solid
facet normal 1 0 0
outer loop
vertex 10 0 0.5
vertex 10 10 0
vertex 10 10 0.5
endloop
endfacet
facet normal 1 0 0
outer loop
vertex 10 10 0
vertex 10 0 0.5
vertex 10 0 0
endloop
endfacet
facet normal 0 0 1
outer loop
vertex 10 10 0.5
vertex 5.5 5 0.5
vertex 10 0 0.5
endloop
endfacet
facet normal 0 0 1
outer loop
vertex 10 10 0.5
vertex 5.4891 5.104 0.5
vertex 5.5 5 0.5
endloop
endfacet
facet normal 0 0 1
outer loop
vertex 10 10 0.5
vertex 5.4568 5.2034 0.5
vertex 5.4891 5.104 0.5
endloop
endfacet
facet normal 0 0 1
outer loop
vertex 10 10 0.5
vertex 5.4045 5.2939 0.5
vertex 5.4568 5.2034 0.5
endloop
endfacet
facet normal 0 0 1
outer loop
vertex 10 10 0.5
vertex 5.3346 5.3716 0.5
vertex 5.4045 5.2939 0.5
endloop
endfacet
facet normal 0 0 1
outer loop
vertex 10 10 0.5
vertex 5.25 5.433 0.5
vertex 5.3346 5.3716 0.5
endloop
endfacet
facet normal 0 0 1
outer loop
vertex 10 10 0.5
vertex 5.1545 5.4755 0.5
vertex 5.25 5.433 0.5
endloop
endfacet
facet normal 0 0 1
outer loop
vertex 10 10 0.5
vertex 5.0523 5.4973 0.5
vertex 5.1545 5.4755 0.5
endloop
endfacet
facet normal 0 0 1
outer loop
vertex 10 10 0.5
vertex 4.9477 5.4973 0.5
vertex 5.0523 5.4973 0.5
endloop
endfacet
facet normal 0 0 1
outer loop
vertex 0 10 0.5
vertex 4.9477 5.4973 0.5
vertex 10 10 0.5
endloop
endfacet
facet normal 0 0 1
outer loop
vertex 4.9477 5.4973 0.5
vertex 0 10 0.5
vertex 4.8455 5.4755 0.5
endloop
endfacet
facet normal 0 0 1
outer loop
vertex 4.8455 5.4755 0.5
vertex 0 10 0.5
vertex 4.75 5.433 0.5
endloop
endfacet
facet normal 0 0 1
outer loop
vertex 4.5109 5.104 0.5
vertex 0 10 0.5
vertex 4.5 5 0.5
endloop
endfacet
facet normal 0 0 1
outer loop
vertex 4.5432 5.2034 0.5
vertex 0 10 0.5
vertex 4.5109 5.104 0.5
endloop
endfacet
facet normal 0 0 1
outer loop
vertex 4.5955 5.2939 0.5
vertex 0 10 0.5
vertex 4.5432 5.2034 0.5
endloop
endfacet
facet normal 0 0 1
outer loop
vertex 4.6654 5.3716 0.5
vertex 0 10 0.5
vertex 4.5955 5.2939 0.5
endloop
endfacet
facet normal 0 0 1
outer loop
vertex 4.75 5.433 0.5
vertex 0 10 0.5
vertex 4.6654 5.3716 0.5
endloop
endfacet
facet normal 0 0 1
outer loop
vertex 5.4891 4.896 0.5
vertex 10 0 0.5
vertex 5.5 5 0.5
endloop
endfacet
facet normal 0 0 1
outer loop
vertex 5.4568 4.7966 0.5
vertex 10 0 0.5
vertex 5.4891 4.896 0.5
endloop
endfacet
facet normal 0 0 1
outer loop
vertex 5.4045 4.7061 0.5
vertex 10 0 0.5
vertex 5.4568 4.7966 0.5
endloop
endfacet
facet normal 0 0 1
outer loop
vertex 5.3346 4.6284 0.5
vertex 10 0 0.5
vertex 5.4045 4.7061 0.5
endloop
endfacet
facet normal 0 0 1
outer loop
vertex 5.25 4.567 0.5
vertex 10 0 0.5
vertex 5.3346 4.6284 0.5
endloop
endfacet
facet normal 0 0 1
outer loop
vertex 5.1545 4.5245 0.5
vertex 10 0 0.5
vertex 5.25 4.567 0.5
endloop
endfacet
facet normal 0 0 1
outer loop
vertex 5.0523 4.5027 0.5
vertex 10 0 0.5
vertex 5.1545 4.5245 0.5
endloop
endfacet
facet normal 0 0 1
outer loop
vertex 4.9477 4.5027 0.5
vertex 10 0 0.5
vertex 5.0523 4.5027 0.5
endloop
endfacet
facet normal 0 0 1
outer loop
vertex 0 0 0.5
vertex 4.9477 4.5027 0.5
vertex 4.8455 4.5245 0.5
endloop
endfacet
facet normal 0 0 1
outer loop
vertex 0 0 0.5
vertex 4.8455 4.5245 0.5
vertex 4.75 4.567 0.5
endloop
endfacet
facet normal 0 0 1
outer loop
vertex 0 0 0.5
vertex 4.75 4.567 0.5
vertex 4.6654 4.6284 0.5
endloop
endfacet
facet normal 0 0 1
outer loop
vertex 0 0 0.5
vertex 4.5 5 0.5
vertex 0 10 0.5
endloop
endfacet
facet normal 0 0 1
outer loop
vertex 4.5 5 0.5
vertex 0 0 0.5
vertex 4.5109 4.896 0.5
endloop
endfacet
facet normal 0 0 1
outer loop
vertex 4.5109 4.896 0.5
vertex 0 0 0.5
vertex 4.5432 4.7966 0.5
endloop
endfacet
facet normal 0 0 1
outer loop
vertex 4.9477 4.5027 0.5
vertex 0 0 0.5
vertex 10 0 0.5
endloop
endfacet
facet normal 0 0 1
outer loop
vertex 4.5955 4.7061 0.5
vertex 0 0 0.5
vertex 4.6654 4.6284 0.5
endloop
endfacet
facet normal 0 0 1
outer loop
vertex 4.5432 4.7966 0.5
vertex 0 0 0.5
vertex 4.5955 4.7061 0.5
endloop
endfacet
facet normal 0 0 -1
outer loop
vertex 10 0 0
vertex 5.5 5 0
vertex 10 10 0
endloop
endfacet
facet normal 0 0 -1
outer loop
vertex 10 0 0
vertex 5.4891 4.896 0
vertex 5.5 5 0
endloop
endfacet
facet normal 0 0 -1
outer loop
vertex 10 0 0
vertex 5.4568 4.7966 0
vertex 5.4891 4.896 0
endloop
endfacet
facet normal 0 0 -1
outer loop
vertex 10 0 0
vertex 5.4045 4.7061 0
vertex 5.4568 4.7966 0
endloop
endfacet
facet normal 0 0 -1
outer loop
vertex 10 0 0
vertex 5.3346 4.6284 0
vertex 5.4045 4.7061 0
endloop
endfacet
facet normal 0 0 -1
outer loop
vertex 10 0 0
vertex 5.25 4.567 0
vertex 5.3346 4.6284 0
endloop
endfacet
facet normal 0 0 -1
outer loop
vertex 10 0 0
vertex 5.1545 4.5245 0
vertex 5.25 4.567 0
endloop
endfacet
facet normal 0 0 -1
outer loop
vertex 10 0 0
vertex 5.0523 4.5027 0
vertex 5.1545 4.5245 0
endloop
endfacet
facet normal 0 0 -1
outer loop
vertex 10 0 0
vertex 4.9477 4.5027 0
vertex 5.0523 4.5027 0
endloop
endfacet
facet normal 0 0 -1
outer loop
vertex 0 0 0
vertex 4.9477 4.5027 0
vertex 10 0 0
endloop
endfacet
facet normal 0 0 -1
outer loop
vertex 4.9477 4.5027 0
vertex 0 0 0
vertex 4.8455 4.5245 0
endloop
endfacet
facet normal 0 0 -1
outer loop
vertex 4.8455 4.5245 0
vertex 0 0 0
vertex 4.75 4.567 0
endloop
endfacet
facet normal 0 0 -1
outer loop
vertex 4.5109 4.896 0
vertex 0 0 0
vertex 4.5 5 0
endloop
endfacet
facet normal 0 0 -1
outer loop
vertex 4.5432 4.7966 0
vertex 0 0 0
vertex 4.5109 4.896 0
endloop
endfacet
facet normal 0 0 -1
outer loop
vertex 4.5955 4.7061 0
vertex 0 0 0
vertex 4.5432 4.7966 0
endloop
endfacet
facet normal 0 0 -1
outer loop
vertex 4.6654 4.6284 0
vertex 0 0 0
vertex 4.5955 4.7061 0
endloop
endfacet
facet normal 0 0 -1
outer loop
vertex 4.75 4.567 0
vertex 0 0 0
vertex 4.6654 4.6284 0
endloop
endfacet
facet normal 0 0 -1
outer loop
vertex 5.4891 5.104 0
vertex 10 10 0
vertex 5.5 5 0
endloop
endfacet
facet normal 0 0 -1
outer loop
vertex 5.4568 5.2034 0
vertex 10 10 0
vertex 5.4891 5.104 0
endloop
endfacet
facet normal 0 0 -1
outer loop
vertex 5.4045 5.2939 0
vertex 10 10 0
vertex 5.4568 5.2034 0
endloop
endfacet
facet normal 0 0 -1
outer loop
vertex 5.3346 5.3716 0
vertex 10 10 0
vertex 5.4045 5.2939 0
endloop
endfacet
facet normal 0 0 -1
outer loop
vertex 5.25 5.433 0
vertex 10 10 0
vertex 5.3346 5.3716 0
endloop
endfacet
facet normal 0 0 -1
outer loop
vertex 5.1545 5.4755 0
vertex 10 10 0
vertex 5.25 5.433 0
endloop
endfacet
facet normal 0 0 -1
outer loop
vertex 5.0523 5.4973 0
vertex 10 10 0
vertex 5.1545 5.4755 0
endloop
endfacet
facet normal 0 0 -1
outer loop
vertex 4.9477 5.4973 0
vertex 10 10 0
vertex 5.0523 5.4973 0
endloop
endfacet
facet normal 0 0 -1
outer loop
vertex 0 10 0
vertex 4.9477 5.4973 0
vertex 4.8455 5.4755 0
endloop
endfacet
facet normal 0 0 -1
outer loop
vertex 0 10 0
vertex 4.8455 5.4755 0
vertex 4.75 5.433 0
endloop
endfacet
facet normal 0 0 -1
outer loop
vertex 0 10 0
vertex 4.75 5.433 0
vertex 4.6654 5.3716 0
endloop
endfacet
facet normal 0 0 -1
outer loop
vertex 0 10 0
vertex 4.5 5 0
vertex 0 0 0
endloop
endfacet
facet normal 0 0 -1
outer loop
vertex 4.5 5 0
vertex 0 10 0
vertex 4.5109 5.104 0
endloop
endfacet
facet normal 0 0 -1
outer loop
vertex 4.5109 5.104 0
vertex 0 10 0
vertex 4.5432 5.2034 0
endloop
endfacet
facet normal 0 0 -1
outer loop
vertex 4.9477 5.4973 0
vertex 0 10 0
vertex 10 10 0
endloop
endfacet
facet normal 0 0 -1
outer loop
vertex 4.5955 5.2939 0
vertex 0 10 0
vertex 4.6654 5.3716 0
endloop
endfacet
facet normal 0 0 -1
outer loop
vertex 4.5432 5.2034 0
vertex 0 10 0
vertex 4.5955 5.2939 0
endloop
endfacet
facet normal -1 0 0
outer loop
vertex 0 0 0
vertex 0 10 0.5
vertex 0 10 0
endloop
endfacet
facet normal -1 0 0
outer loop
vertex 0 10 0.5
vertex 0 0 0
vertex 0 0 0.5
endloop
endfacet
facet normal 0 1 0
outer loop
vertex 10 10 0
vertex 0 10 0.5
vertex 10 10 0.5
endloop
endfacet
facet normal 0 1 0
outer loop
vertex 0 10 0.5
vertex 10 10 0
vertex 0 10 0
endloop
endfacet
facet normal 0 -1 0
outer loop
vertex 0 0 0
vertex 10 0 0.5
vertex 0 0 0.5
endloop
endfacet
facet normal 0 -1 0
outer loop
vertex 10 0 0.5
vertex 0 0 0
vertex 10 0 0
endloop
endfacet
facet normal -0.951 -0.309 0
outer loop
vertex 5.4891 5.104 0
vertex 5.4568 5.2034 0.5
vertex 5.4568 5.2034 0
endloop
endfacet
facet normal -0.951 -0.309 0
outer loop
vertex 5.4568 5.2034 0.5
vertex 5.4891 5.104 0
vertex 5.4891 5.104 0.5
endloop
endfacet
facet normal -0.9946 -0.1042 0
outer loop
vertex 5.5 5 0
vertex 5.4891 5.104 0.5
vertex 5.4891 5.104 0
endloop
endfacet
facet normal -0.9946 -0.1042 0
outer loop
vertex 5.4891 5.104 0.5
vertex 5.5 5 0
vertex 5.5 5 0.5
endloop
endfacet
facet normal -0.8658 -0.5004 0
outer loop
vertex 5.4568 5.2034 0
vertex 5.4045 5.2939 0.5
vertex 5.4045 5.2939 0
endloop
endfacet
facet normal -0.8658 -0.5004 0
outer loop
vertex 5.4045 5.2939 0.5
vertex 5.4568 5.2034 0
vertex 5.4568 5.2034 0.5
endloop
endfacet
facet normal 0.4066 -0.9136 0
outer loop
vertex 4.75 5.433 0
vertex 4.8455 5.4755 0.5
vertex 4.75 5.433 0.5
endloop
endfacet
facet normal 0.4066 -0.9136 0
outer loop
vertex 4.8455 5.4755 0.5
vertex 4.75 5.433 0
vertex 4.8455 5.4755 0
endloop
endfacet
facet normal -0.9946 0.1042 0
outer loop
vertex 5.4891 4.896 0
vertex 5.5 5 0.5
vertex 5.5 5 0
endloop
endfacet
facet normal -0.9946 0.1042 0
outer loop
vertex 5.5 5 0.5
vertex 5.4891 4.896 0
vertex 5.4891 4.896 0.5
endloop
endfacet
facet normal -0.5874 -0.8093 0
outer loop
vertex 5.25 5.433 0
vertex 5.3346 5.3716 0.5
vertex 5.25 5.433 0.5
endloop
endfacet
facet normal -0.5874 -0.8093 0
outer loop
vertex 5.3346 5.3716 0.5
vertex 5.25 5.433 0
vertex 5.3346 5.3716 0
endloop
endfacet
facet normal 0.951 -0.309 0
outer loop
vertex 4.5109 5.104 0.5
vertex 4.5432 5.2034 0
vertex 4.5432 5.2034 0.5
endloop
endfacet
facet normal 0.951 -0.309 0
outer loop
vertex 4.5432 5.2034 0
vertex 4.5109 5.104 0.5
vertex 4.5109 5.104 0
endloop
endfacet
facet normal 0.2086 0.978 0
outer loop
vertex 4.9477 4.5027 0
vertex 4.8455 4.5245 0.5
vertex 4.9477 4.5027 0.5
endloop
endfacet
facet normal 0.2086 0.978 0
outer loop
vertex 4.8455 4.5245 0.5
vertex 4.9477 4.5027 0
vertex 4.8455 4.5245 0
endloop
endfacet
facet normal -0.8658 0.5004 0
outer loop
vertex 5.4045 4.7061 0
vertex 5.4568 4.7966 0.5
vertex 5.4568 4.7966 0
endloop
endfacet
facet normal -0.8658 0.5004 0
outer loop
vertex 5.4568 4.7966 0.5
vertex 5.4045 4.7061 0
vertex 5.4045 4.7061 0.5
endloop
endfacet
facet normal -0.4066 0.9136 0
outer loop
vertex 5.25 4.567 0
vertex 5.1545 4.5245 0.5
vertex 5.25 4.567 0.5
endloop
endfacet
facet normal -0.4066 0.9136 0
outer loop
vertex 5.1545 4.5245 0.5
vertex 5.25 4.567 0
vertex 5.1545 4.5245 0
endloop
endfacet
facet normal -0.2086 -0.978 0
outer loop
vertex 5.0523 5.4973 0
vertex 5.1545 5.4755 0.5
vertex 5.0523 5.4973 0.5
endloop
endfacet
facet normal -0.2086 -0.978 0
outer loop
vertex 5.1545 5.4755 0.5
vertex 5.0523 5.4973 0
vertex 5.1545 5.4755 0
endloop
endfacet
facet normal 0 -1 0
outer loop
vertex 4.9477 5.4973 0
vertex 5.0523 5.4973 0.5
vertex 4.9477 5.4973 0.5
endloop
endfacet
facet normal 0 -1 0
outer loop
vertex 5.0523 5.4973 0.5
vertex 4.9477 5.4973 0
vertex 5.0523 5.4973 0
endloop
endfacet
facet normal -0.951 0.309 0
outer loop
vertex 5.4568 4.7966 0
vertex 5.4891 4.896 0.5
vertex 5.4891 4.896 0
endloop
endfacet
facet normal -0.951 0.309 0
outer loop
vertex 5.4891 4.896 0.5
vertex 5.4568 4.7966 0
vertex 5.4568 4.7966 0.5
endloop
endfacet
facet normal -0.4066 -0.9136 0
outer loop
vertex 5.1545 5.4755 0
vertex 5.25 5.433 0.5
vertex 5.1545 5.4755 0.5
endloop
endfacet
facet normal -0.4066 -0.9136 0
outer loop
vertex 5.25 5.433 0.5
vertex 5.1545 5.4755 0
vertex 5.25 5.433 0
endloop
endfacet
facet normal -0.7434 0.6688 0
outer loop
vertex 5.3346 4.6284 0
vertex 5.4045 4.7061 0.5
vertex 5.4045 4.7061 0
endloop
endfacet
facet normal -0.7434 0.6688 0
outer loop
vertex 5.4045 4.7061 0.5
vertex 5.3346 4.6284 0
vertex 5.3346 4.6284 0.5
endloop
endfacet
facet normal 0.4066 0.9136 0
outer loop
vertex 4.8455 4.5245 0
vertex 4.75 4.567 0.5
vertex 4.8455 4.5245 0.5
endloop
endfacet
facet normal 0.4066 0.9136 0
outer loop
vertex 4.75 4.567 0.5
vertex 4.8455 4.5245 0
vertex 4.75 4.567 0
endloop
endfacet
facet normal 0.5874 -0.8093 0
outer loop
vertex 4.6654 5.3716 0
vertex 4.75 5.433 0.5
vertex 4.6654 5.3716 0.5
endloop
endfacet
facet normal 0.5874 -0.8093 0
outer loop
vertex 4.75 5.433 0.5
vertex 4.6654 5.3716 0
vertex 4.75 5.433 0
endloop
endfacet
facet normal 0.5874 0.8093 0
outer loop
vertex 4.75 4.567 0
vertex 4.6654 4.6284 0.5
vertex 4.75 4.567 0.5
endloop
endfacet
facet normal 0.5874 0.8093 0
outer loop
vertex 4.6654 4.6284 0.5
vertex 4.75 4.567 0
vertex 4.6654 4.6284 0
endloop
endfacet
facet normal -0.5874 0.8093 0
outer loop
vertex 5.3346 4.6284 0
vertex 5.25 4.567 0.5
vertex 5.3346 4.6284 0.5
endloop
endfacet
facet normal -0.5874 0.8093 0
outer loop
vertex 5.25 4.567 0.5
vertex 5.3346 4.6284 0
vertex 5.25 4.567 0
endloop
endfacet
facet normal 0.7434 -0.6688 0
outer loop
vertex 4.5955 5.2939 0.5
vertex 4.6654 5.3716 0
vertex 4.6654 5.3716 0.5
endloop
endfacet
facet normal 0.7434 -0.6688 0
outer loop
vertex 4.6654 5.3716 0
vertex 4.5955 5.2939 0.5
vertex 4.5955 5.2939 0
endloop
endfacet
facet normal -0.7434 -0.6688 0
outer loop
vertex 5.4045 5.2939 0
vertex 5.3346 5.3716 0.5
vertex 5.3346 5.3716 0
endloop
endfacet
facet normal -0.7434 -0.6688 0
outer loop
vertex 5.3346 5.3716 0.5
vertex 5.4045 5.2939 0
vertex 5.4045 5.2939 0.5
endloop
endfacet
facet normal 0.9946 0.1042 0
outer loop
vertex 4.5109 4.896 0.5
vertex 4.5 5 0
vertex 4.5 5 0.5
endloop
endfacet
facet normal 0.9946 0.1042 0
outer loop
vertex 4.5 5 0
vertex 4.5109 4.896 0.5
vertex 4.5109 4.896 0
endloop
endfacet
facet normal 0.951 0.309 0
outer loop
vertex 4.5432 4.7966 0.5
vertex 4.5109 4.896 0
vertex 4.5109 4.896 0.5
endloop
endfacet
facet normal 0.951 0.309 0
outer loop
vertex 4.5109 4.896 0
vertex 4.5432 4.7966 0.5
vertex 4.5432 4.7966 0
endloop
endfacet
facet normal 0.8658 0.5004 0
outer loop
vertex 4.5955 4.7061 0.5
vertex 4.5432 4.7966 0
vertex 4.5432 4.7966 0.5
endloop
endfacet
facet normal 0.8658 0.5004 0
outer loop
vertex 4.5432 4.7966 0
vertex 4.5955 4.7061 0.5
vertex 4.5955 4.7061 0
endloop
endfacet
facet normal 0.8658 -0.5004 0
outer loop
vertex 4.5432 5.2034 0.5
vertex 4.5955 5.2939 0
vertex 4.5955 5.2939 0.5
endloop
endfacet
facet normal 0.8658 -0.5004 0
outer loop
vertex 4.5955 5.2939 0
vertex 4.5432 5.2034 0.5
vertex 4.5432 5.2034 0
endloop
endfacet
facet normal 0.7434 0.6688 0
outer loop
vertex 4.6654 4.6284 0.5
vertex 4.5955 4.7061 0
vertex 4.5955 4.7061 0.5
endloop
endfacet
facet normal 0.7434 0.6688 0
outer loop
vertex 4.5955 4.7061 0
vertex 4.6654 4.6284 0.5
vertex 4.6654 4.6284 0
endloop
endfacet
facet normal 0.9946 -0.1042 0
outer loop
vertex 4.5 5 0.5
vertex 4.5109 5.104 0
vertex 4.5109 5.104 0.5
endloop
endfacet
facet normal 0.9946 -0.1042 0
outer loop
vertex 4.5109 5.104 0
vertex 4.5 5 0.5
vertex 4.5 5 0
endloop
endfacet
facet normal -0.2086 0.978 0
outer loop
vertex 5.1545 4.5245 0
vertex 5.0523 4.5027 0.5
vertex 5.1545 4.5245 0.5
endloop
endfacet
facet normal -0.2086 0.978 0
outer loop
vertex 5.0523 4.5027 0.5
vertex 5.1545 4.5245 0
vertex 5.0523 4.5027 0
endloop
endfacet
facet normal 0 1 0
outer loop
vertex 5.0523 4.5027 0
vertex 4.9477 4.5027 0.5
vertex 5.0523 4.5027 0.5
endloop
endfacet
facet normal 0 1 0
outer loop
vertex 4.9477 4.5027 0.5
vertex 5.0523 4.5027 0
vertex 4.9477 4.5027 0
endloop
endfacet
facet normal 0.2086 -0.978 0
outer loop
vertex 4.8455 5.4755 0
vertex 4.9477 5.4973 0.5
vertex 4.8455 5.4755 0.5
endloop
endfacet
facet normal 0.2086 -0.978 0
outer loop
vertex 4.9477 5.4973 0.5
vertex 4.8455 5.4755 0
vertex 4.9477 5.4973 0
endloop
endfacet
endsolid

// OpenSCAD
//$fn = 30;

//-----------------------------
//difference() {
//    cube([5, 5, 1]);
//    translate([2.5, 2.5, 0]) cylinder(r = 1, h = 1);
//}
//-----------------------------

//-----------------------------
//module plate() {
//    difference() {
//        cube([6, 6, 1]);
//        translate([3, 3, 0]) cylinder(r = 0.5, h = 1);
//    }
//}

//rotate(a = 45, v =[0, 0, 1]) { translate([-3, -3, 0]) plate(); }
//-----------------------------

//-----------------------------
module plate(length, width, thickness) {
    difference() {
        cube([length, width, thickness]);
        translate([length/2, width/2, 0]) cylinder(r = 0.5, h = 1, $fn = 30);
    }
}

plate (10, 10, 0.5);
//-----------------------------
    
